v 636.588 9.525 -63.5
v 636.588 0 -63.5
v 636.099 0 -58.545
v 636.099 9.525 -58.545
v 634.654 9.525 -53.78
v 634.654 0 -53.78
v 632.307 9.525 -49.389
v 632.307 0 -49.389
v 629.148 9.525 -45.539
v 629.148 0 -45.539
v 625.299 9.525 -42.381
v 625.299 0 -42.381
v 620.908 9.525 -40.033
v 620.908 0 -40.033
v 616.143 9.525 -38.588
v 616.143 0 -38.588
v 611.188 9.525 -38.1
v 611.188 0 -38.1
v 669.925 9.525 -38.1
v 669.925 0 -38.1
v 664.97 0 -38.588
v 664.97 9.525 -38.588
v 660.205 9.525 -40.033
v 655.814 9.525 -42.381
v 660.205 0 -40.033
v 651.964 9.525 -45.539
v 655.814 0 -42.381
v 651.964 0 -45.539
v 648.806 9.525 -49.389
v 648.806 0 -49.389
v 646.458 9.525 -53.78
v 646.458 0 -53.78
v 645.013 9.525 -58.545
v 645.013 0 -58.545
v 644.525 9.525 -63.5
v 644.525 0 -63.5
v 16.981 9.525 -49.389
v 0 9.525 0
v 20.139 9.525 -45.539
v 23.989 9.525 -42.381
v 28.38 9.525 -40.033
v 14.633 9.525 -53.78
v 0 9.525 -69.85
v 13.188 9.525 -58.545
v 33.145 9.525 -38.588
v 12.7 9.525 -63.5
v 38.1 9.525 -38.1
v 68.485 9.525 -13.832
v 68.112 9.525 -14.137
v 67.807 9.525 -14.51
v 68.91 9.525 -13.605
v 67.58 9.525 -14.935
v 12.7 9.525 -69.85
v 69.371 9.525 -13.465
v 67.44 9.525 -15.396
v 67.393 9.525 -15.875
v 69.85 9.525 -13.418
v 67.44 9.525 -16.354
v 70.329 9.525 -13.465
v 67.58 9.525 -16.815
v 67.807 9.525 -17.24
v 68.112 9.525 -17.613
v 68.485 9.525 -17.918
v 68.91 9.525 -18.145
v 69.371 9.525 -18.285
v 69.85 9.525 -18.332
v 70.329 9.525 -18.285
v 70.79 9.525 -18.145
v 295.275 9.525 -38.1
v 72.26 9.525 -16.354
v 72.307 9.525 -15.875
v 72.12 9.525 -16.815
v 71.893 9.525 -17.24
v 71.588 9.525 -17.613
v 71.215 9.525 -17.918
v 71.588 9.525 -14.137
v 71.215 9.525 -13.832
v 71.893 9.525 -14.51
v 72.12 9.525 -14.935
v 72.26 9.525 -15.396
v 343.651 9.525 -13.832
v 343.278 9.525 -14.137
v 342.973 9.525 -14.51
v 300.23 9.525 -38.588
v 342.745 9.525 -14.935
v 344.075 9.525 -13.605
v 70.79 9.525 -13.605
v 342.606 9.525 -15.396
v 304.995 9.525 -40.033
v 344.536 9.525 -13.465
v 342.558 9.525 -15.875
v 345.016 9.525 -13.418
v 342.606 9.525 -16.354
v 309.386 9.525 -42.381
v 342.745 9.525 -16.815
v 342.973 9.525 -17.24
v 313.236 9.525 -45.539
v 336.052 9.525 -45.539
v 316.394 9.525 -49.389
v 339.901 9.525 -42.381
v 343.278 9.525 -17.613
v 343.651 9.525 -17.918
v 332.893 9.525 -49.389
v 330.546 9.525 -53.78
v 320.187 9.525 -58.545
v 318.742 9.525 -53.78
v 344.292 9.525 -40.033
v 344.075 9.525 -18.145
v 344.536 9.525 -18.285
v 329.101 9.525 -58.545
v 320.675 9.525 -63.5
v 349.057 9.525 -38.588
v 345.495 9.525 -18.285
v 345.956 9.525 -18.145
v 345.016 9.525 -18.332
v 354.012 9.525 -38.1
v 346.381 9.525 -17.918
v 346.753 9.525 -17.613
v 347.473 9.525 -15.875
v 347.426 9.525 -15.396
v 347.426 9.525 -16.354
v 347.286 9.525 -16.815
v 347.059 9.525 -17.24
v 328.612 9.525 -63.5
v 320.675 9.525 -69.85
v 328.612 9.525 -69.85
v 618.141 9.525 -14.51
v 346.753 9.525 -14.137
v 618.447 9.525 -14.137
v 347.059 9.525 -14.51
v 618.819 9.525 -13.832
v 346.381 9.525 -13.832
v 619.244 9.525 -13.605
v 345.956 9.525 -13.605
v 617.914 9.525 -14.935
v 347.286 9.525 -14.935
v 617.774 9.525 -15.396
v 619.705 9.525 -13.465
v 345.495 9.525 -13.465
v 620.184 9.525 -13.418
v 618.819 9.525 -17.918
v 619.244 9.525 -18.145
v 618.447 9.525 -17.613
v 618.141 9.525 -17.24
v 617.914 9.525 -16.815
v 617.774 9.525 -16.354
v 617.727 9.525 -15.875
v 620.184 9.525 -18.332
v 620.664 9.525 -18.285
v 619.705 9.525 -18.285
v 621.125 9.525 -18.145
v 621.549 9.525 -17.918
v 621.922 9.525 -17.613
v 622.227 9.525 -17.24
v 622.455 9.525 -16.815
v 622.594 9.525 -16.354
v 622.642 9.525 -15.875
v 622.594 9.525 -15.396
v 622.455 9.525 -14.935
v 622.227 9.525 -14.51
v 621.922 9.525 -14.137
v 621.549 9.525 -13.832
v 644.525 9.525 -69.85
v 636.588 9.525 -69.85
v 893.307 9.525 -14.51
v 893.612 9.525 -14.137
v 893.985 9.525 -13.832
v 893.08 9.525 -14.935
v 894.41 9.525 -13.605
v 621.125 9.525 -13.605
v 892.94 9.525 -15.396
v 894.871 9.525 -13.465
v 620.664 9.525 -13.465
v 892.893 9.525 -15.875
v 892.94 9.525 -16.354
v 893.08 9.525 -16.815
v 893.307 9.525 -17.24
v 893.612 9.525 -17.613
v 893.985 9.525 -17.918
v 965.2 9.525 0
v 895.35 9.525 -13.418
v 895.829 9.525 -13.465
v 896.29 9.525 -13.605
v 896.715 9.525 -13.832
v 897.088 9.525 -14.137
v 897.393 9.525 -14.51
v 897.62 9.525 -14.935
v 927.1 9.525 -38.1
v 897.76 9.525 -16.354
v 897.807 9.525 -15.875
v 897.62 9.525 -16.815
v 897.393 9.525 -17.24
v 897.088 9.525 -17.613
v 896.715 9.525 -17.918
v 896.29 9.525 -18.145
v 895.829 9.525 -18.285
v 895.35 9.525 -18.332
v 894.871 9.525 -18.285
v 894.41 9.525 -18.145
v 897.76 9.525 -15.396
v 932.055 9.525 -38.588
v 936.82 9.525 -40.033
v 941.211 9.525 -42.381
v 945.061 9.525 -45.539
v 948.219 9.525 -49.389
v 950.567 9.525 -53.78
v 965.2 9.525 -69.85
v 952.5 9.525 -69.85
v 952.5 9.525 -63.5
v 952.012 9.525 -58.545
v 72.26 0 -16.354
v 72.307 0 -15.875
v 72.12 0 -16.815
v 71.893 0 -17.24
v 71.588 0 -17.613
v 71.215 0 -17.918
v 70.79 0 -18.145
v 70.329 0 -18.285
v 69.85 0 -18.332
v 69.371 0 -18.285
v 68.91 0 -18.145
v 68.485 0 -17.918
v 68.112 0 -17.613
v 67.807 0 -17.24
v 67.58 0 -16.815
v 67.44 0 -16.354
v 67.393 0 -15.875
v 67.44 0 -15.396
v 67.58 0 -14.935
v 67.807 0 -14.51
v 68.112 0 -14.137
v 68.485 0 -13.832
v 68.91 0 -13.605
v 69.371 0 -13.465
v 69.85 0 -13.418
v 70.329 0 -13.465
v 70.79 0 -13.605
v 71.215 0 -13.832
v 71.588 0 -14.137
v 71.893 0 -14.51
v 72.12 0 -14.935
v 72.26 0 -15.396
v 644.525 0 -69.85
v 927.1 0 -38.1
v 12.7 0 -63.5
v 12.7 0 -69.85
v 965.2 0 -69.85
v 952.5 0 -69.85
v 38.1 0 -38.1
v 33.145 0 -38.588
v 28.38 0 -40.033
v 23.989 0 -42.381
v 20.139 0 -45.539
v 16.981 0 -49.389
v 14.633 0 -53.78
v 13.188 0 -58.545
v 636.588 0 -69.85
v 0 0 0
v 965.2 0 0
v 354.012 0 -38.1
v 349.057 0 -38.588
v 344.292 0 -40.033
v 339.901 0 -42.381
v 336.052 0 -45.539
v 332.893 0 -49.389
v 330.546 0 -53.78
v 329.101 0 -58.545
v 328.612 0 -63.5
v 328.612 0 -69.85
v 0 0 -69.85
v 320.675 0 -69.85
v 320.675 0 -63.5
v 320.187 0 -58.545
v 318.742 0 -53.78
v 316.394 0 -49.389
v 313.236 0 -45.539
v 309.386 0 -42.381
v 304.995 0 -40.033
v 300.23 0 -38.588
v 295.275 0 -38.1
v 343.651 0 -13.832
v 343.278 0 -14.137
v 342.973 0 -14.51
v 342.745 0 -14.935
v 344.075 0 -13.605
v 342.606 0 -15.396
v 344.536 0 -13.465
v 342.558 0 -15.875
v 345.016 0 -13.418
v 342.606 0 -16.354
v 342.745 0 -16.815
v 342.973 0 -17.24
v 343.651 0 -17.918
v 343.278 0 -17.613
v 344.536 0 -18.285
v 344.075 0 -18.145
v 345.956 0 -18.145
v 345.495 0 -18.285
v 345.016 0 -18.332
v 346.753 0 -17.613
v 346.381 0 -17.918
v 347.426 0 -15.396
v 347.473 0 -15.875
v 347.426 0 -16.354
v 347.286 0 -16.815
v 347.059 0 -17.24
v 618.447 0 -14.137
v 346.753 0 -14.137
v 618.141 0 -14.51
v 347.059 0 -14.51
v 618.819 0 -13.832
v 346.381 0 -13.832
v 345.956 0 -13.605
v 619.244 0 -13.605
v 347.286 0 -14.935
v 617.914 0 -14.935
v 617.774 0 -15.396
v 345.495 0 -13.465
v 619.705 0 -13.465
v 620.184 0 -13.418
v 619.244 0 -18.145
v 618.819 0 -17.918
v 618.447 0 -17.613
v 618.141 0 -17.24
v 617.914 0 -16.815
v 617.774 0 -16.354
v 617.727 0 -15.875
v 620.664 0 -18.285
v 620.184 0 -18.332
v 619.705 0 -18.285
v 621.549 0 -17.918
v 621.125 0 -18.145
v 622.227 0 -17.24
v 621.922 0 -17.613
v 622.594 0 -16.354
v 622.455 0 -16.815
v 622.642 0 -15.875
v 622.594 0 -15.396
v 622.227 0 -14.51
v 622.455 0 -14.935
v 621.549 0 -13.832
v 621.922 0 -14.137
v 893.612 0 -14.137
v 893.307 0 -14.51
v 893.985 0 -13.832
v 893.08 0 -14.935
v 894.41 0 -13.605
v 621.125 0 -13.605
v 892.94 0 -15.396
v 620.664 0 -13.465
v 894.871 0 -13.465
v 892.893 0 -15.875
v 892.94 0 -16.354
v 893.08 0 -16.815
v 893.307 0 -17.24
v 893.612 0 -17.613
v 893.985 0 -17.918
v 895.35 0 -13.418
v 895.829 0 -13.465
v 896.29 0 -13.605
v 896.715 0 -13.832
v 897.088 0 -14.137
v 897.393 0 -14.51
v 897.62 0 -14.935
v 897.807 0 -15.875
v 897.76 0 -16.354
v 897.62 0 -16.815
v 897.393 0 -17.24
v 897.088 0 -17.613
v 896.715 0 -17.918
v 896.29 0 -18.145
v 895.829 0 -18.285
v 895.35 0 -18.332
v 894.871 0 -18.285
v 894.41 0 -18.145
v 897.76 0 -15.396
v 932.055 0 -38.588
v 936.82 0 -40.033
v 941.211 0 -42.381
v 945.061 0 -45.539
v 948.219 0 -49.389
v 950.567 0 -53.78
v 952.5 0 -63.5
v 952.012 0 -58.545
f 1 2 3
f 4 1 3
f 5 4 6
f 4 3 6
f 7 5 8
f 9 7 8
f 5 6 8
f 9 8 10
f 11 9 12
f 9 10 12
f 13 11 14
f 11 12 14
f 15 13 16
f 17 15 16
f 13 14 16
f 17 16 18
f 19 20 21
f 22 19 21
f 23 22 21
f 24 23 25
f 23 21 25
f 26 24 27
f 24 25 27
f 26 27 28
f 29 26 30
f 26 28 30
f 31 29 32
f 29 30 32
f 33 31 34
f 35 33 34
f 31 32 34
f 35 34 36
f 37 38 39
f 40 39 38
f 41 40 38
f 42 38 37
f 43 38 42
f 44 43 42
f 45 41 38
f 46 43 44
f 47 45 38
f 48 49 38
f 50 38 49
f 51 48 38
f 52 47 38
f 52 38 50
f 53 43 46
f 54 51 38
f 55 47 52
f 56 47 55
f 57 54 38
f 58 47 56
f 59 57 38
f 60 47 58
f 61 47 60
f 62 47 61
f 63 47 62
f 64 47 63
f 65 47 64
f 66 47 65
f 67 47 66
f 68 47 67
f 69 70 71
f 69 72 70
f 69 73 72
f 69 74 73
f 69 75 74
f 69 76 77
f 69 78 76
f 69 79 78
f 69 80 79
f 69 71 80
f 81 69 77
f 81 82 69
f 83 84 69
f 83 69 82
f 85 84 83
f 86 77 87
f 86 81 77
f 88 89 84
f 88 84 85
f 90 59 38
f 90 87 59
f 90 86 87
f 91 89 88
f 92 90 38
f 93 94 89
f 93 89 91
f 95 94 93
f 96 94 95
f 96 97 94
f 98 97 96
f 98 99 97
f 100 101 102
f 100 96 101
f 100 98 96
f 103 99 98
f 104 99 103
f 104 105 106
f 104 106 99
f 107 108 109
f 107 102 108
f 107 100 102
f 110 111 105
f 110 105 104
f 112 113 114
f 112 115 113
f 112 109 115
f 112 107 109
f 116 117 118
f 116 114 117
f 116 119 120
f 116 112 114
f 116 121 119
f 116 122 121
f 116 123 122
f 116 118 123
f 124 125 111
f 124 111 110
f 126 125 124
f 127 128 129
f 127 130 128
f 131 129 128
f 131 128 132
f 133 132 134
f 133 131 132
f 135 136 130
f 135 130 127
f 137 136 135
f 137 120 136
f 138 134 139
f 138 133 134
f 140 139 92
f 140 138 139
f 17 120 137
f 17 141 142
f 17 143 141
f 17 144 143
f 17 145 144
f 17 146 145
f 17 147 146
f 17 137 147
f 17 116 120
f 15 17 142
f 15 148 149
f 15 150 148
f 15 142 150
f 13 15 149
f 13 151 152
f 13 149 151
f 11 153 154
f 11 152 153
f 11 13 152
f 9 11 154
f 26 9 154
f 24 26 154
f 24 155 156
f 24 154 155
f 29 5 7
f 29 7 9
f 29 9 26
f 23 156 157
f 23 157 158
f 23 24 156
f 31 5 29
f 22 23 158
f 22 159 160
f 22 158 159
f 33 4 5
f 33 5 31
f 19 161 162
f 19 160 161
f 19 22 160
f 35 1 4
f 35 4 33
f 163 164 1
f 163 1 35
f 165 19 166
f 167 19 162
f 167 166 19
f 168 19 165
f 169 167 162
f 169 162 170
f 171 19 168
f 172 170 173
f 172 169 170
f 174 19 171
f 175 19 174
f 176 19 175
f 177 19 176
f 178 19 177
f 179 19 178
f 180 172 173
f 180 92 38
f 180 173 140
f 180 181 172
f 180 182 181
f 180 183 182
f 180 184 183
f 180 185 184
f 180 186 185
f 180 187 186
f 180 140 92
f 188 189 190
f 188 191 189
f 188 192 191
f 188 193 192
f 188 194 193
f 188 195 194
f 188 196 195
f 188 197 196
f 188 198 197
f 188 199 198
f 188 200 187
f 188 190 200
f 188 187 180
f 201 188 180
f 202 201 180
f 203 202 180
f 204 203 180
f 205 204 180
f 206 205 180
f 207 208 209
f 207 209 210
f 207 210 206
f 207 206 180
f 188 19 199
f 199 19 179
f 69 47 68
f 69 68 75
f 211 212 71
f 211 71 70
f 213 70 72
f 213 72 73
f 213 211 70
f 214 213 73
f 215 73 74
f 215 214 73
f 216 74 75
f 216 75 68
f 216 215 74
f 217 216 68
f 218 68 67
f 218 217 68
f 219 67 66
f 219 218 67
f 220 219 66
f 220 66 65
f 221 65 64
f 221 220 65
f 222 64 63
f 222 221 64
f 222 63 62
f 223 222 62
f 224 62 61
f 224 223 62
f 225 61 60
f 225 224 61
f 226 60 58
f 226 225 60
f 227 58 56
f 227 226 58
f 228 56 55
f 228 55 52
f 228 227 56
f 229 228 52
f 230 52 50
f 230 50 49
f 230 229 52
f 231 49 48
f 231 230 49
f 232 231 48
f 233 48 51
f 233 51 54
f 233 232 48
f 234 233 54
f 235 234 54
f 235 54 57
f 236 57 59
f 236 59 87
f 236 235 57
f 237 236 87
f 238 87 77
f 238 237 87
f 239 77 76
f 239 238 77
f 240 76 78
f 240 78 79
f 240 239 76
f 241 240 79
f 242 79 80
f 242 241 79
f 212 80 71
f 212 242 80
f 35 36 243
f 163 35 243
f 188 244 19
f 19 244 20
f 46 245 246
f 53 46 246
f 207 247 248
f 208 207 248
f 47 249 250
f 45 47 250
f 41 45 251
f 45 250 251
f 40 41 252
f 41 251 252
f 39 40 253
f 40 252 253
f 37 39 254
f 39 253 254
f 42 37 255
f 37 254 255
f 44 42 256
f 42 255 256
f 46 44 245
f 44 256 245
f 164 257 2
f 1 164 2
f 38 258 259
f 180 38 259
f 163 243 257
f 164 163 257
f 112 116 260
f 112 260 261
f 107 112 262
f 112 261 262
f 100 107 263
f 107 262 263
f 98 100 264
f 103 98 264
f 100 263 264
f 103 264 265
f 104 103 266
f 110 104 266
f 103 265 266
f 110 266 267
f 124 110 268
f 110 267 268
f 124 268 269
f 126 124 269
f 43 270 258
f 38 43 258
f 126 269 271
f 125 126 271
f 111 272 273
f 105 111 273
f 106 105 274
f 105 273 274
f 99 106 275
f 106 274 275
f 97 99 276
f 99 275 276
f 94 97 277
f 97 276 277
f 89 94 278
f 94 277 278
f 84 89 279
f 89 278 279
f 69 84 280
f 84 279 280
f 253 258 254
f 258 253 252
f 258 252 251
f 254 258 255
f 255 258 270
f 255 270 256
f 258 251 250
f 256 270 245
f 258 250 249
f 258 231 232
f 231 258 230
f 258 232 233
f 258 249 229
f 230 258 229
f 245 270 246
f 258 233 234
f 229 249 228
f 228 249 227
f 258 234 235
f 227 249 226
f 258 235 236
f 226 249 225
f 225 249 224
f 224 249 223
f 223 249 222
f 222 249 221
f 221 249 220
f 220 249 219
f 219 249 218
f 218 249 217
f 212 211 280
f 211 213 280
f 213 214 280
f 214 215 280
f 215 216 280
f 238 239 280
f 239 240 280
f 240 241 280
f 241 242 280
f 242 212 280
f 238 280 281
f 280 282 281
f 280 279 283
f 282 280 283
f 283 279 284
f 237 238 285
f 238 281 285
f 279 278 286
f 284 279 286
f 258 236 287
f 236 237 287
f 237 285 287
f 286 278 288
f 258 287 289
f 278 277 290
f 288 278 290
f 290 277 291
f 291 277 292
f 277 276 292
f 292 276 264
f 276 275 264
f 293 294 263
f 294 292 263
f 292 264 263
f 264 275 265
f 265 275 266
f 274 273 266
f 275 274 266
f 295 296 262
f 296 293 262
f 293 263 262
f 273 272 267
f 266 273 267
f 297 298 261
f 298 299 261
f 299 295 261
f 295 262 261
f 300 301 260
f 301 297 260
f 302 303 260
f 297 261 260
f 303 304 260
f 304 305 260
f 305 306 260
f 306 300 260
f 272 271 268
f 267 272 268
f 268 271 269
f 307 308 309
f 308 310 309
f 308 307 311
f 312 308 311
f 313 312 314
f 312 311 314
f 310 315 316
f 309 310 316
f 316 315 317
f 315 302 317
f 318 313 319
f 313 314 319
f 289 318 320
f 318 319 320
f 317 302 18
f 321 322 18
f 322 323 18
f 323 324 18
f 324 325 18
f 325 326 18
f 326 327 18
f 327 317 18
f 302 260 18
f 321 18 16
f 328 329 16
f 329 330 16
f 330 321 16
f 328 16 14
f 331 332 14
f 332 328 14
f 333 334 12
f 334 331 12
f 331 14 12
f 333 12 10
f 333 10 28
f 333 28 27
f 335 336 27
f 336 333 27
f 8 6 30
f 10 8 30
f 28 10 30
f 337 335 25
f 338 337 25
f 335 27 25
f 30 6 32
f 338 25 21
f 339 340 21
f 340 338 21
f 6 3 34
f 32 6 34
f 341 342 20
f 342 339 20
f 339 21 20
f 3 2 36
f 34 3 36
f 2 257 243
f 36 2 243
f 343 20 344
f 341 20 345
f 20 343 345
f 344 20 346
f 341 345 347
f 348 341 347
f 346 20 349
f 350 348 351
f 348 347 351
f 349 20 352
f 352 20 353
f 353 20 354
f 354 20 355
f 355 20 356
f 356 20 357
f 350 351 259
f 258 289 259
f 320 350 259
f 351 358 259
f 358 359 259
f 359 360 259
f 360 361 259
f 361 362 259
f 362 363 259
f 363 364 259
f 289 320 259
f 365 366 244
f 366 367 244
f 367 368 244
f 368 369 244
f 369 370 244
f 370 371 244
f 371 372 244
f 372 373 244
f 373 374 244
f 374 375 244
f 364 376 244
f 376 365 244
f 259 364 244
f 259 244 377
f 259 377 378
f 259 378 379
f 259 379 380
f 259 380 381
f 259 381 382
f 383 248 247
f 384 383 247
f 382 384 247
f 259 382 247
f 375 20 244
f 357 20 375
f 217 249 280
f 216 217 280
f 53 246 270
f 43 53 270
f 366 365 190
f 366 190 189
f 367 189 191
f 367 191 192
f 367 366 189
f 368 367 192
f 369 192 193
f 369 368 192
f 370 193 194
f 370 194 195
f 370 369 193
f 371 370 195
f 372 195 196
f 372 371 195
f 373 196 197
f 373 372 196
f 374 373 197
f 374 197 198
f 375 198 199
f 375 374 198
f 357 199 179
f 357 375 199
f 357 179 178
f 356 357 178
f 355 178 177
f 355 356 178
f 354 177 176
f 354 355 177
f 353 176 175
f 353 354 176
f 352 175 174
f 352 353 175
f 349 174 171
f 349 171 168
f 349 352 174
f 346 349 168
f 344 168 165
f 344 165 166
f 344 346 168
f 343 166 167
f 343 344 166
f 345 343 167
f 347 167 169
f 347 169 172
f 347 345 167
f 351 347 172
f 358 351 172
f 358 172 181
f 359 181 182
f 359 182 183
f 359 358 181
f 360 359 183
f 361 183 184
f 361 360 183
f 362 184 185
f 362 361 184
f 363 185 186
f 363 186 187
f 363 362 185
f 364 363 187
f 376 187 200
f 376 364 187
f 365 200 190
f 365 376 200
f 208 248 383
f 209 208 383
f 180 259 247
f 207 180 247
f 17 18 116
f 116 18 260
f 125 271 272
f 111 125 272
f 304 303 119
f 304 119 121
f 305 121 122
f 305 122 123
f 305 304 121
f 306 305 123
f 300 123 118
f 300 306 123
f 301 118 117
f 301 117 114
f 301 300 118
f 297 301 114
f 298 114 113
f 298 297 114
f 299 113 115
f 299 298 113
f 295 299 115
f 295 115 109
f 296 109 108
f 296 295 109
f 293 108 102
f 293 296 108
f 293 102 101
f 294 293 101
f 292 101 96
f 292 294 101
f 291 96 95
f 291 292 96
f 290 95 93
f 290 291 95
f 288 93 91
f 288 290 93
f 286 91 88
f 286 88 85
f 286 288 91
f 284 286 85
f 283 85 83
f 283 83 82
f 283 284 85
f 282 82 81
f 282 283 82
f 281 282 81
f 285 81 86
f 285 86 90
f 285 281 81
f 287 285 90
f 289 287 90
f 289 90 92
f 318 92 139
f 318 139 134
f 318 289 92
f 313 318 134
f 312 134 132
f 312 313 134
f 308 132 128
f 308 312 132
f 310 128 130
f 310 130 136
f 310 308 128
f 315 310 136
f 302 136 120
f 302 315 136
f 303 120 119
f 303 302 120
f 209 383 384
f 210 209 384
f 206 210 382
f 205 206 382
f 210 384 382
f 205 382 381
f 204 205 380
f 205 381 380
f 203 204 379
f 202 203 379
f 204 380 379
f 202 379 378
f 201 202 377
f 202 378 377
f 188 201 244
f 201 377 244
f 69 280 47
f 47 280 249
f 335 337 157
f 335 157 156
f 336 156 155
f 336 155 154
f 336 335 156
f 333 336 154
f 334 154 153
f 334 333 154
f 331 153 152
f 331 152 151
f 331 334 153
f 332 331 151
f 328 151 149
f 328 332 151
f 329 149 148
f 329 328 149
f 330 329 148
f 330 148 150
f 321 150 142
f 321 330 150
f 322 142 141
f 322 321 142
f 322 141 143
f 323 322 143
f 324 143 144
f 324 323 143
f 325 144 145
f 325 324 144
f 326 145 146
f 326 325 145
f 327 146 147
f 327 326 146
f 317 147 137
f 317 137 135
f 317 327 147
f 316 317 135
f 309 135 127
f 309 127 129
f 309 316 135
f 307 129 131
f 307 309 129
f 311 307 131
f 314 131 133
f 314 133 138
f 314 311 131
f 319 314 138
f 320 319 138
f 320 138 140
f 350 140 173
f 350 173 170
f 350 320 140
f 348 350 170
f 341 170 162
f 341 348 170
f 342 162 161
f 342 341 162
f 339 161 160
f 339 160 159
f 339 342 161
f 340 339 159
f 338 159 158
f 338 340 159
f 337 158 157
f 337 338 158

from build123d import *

# Parameters (mm, degrees)
SKETCH1_R           = 2.45745
BOSS_EXTRUDE1_DEPTH = 9.525


with BuildPart() as part:
    # Sketch1 → Boss-Extrude1 (new body)
    with BuildSketch(Plane(origin=(0, 0, 0), x_dir=(1, 0, 0), z_dir=(0, 1, 0))):
        with BuildLine():
            Line((0, 0), (965.2, 0))
            Line((965.2, 0), (965.2, 69.85))
            Line((965.2, 69.85), (952.5, 69.85))
            Line((952.5, 69.85), (952.5, 63.5))
            ThreePointArc((952.5, 63.5), (945.060512242, 45.539487758), (927.1, 38.1))
            Line((927.1, 38.1), (669.925, 38.1))
            ThreePointArc((669.925, 38.1), (651.964487758, 45.539487758), (644.525, 63.5))
            Line((644.525, 63.5), (644.525, 69.85))
            Line((644.525, 69.85), (636.5875, 69.85))
            Line((636.5875, 69.85), (636.5875, 63.5))
            ThreePointArc((636.5875, 63.5), (629.148012242, 45.539487758), (611.1875, 38.1))
            Line((611.1875, 38.1), (354.0125, 38.1))
            ThreePointArc((354.0125, 38.1), (336.051987758, 45.539487758), (328.6125, 63.5))
            Line((328.6125, 63.5), (328.6125, 69.85))
            Line((328.6125, 69.85), (320.675, 69.85))
            Line((320.675, 69.85), (320.675, 63.5))
            ThreePointArc((320.675, 63.5), (313.235512242, 45.539487758), (295.275, 38.1))
            Line((295.275, 38.1), (38.1, 38.1))
            ThreePointArc((38.1, 38.1), (20.139487758, 45.539487758), (12.7, 63.5))
            Line((12.7, 63.5), (12.7, 69.85))
            Line((12.7, 69.85), (0, 69.85))
            Line((0, 69.85), (0, 0))
        make_face()
        with Locations((69.85, 15.875)):
            Circle(SKETCH1_R, mode=Mode.SUBTRACT)
        with Locations((345.01582, 15.875)):
            Circle(SKETCH1_R, mode=Mode.SUBTRACT)
        with Locations((895.35, 15.875)):
            Circle(SKETCH1_R, mode=Mode.SUBTRACT)
        with Locations((620.18418, 15.875)):
            Circle(SKETCH1_R, mode=Mode.SUBTRACT)
    extrude(amount=BOSS_EXTRUDE1_DEPTH)


solid = part.part
